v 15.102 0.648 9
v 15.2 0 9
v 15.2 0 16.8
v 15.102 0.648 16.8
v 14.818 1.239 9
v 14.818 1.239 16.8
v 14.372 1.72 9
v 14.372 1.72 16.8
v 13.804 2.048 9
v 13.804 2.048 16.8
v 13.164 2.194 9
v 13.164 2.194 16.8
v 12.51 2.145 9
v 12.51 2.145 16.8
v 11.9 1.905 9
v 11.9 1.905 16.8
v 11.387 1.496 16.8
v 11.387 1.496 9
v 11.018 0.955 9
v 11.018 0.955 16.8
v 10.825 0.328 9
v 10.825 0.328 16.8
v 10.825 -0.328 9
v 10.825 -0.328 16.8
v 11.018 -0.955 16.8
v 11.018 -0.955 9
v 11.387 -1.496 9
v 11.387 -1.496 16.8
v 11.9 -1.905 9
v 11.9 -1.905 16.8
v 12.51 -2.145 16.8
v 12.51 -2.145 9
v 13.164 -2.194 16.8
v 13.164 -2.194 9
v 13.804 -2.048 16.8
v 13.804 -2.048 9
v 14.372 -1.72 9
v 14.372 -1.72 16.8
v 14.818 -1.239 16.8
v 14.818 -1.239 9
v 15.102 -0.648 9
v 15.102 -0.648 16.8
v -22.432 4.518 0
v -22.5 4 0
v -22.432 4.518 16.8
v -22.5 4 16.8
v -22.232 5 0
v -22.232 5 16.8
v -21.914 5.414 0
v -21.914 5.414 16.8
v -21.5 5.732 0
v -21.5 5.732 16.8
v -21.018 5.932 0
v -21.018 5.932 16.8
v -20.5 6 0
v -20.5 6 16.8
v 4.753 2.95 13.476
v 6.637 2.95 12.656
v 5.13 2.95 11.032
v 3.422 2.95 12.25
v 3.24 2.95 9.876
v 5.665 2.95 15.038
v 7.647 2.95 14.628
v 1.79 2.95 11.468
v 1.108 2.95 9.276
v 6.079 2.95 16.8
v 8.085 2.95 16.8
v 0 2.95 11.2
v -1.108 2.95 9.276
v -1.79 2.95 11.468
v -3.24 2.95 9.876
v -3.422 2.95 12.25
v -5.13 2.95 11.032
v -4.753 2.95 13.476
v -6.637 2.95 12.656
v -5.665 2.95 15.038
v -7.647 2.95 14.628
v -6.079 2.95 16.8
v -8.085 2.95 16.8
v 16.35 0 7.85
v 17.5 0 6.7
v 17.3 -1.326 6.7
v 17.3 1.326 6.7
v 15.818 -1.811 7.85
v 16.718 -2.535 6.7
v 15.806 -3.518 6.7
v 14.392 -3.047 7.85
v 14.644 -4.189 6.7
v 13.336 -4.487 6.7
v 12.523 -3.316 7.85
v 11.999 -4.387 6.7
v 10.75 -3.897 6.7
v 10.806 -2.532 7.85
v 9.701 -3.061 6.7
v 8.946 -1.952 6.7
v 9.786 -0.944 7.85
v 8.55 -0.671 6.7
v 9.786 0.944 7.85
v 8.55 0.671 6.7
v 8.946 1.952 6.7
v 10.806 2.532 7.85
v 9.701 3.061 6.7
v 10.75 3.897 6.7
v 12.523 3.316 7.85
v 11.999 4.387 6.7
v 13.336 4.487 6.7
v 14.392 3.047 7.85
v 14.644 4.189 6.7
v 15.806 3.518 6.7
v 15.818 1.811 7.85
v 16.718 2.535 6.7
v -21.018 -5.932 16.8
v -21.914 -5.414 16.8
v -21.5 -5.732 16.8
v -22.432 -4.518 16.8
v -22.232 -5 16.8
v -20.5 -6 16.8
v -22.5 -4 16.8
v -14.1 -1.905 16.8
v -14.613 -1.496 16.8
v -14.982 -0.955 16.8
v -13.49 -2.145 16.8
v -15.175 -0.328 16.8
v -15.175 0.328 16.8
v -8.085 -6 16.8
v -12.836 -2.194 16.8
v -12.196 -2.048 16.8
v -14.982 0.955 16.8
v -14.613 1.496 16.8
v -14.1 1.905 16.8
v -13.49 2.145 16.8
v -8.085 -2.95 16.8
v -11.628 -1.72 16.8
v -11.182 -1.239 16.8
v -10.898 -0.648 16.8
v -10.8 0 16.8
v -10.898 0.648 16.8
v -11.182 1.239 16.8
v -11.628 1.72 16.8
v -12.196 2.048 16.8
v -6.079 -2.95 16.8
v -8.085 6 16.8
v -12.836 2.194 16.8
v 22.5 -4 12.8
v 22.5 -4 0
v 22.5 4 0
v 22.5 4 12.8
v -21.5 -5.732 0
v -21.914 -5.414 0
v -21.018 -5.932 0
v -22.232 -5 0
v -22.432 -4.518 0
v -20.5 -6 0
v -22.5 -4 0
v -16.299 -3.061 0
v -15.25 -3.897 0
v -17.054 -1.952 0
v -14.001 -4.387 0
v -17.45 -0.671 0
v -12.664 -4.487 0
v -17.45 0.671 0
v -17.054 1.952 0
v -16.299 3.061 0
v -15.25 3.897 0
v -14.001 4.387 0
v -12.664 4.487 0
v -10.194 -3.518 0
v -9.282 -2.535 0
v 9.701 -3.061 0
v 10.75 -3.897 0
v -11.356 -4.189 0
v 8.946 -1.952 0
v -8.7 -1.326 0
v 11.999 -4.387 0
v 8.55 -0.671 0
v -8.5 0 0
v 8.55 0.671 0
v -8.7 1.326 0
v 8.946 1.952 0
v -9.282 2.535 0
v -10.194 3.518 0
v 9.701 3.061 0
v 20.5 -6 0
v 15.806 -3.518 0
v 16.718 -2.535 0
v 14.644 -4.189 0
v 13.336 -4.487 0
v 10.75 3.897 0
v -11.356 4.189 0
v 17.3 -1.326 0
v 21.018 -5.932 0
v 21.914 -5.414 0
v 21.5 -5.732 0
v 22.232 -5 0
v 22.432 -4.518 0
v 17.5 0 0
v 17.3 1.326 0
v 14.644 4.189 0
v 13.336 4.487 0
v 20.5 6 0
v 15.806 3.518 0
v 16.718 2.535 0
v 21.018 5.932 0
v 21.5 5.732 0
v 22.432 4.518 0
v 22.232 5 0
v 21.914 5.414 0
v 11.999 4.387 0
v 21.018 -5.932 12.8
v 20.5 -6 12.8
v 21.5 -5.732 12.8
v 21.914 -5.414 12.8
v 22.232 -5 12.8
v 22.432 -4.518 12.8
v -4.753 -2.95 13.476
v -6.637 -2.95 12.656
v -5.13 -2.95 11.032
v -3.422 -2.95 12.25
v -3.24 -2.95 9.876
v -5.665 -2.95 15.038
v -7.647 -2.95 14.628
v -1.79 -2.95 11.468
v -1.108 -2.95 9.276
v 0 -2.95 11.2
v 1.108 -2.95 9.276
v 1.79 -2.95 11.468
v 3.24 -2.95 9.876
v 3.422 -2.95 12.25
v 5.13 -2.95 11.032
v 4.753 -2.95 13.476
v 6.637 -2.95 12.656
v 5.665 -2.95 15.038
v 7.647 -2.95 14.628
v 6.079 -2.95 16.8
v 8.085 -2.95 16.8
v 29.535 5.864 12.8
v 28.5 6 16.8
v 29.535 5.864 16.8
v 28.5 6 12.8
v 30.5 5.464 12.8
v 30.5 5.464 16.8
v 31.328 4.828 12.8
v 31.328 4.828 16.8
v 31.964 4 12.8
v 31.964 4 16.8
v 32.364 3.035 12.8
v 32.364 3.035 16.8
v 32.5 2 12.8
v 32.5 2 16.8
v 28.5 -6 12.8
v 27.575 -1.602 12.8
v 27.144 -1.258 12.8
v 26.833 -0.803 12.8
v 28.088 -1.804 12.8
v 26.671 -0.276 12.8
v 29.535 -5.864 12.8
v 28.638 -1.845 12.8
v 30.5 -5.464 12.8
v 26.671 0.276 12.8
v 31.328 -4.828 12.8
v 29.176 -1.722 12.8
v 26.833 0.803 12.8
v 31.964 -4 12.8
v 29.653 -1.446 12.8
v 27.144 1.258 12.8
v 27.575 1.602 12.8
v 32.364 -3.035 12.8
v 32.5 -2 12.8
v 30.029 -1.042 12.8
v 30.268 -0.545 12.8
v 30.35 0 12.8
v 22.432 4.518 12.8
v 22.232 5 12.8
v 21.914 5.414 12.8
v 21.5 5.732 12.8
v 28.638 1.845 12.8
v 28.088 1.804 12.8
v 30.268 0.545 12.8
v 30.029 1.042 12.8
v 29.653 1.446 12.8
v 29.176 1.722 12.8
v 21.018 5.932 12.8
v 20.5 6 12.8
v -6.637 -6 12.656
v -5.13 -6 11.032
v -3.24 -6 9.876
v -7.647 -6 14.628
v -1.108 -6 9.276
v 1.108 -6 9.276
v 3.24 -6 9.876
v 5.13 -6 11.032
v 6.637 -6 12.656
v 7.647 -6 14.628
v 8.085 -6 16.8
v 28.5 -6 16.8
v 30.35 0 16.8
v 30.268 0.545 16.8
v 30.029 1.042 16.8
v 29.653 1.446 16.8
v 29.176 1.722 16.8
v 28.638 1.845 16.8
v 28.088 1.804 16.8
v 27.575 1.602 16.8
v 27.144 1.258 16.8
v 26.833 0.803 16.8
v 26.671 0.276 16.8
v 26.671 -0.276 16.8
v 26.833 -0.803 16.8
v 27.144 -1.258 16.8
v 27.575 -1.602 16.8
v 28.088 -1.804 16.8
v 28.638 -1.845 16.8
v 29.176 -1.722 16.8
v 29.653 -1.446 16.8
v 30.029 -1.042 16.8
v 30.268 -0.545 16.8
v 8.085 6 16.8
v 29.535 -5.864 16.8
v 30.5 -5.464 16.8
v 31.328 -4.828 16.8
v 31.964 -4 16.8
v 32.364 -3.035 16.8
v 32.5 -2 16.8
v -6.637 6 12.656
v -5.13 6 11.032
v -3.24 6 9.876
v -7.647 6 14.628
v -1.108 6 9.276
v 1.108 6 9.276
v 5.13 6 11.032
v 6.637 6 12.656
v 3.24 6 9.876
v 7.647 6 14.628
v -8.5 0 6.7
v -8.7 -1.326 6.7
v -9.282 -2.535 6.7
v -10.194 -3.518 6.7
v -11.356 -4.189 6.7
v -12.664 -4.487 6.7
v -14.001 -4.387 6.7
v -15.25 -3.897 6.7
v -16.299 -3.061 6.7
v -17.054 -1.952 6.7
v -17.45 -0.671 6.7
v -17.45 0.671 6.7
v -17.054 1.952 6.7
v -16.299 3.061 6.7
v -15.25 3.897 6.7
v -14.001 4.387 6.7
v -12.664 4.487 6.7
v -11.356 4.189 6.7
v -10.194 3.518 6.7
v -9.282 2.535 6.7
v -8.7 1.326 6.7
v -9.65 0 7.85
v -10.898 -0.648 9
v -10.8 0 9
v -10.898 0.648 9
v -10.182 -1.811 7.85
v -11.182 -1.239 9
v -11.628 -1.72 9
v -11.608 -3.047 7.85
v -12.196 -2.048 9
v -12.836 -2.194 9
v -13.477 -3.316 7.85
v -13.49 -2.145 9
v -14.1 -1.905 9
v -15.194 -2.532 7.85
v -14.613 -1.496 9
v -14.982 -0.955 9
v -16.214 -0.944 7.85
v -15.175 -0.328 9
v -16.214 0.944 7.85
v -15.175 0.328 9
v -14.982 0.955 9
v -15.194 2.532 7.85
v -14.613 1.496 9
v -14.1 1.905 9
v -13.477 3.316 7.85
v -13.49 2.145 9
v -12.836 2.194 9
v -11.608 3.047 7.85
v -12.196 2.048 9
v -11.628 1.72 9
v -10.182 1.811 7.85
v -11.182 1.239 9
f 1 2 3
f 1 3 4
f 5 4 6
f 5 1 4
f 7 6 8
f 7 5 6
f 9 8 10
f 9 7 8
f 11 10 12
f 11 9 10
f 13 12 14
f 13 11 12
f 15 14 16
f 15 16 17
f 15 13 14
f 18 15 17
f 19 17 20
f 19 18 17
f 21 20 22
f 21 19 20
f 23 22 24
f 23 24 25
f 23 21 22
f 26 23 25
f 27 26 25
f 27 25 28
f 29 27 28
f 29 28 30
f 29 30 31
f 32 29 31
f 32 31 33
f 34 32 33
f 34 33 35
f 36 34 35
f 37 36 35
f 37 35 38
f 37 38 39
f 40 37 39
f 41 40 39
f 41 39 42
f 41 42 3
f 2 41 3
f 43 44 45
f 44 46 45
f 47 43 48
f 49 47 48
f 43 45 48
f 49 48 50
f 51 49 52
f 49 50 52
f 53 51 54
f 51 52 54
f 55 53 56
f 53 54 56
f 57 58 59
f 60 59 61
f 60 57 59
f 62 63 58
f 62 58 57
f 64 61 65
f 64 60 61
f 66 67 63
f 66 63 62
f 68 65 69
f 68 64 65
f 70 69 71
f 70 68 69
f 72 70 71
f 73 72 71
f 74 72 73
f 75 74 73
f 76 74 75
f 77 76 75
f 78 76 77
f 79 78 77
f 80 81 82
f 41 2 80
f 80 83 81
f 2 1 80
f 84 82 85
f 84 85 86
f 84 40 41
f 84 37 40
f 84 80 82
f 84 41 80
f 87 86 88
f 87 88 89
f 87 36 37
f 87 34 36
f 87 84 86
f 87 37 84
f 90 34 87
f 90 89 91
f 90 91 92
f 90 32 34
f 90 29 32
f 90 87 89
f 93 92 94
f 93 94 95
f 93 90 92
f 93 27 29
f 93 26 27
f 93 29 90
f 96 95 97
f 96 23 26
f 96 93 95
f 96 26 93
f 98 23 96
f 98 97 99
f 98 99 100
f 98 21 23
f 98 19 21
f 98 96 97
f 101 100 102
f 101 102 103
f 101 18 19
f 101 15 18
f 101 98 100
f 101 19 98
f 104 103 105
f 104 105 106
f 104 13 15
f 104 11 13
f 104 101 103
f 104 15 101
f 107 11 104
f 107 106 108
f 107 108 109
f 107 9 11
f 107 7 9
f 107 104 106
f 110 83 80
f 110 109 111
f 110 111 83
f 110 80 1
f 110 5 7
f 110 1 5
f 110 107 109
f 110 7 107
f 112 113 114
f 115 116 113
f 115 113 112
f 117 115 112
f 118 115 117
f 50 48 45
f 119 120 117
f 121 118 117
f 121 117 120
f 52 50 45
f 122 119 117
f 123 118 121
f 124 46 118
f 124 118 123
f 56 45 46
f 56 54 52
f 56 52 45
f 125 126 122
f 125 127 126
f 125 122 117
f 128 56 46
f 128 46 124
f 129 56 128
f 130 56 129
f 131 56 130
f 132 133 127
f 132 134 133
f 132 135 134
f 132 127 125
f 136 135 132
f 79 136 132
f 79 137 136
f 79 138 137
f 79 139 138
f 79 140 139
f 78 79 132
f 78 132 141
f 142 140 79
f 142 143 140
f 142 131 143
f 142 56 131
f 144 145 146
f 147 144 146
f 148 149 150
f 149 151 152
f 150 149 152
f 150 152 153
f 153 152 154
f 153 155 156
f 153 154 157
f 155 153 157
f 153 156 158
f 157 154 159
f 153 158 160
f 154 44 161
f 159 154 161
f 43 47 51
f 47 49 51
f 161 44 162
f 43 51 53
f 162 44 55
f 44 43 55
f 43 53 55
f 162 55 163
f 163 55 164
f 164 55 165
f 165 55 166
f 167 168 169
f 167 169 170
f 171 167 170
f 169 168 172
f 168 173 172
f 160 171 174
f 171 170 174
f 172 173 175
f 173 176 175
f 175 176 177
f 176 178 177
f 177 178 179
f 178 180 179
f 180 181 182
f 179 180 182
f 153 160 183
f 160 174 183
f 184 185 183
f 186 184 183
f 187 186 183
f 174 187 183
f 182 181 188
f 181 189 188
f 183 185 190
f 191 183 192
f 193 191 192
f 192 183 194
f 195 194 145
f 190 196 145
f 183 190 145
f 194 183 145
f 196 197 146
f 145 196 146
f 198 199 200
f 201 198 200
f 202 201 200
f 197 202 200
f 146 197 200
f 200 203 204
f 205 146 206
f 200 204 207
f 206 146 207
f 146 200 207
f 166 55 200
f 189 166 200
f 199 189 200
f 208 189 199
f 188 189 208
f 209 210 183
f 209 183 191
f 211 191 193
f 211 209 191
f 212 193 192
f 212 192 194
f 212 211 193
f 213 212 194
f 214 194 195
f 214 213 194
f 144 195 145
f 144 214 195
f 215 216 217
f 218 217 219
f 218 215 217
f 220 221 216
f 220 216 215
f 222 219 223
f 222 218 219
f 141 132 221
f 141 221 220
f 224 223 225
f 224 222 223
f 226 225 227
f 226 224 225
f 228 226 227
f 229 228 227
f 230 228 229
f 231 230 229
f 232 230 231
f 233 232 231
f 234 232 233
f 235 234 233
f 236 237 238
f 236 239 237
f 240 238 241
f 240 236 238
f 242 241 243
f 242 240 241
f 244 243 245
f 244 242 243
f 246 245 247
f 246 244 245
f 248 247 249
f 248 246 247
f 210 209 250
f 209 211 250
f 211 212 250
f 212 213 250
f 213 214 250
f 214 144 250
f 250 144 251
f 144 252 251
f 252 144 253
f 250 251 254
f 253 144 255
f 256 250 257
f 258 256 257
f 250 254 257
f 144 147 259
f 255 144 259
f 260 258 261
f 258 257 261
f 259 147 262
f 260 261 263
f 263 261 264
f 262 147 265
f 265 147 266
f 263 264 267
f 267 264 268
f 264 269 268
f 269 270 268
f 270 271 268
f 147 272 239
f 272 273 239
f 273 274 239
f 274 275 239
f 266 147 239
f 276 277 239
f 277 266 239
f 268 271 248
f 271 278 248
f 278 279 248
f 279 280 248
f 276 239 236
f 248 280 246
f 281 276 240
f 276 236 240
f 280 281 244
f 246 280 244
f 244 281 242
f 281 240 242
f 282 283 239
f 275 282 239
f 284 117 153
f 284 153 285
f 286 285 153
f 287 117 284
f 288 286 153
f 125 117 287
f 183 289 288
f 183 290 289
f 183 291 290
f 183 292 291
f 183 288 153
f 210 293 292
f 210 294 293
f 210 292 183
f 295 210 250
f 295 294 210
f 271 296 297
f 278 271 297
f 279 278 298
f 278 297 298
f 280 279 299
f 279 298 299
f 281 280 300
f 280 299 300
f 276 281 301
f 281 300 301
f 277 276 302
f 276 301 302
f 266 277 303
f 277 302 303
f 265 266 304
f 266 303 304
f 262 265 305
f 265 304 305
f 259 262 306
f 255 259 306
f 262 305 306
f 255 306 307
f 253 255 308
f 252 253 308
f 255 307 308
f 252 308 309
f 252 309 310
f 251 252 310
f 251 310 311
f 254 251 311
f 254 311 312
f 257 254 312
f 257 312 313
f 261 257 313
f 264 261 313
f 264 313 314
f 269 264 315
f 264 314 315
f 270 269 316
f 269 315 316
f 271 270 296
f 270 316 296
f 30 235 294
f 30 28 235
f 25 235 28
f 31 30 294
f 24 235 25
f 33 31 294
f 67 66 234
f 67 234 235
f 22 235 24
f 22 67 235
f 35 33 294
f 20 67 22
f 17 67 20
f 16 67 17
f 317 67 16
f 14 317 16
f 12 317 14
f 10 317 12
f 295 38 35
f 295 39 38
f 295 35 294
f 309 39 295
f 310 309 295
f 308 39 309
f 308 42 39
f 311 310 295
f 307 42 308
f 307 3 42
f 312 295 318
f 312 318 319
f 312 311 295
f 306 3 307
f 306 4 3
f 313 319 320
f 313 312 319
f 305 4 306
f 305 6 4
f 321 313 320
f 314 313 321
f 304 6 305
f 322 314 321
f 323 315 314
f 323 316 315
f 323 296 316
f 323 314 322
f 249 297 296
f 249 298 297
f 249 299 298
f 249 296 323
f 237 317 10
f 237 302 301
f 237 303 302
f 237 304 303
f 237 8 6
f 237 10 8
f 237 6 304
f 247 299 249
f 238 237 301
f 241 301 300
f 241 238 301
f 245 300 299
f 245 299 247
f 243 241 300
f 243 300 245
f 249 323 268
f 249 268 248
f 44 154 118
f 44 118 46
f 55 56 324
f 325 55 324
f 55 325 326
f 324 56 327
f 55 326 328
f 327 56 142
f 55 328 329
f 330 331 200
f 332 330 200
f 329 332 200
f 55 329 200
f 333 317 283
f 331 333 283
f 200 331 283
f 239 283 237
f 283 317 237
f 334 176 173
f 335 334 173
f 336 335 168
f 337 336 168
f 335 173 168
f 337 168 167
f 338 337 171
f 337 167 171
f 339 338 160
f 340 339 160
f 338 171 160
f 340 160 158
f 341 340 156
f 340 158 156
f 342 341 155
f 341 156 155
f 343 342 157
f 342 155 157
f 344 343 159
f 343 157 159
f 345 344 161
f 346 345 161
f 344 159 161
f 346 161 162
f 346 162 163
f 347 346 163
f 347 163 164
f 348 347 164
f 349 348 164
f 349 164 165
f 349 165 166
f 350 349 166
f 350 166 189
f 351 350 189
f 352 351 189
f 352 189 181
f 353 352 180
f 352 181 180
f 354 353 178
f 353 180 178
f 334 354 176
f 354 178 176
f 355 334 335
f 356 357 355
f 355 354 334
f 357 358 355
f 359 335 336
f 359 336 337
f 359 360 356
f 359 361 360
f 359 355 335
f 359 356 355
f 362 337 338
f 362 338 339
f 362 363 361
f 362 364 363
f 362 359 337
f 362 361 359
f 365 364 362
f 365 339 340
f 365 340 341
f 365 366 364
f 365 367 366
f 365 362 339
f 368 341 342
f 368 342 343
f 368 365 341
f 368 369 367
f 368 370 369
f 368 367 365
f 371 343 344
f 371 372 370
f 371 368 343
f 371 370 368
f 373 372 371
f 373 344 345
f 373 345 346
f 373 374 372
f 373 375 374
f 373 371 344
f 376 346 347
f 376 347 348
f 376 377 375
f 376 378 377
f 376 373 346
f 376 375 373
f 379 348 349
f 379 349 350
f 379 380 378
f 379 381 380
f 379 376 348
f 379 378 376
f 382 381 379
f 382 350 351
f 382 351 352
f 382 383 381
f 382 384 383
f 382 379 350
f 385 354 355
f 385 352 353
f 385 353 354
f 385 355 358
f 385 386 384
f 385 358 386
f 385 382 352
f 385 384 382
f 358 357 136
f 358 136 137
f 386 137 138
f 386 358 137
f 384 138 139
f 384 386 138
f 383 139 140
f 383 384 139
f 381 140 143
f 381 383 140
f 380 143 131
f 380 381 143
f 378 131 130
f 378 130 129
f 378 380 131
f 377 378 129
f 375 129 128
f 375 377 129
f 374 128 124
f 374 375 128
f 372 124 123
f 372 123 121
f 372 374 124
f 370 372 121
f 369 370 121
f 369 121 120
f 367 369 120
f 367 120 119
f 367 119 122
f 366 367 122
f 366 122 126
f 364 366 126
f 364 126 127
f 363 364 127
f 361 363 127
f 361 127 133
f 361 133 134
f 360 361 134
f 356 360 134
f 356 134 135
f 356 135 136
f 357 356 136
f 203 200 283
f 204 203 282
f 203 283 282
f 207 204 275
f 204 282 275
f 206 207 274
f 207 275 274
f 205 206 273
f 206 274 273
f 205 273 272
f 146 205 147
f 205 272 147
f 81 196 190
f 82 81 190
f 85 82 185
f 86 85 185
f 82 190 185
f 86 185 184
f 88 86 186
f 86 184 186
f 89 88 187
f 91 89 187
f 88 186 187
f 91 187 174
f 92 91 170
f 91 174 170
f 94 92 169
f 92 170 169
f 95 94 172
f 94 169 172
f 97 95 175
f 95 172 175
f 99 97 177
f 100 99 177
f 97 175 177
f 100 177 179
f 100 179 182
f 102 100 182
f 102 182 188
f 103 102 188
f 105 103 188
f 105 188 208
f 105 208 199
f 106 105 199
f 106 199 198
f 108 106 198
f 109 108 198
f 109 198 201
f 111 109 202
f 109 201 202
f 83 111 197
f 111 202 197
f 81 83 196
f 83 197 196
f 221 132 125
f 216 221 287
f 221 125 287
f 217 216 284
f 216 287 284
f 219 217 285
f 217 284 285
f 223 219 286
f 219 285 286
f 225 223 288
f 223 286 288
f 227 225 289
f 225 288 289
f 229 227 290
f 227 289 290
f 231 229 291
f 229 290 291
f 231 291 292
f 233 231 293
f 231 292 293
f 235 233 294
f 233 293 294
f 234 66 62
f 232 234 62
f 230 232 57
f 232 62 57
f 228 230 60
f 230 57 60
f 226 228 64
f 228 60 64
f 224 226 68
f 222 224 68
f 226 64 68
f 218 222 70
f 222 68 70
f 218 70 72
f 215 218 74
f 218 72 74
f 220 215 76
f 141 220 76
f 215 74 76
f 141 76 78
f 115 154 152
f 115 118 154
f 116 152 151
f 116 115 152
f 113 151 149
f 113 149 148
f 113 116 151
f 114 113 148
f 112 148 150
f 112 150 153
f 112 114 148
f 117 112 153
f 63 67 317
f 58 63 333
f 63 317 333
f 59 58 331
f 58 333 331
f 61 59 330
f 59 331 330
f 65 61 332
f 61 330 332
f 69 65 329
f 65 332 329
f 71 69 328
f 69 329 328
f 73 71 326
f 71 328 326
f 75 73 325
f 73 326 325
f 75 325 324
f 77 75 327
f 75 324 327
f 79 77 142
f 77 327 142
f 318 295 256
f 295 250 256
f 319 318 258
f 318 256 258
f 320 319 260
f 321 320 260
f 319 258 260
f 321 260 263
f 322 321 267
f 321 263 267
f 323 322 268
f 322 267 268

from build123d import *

# Parameters (mm, degrees)
F0_W      = 45
F0_H      = 12
F0_R      = 2.2
F1_DEPTH  = 16.8
F3_DEPTH  = 12.001
F4_R      = 8.1
F5_DEPTH  = 3.05
F6_R      = 8.1
F7_DEPTH  = 3.05
F8_R      = 4.5
F8_R_2    = 2.2
F9_DEPTH  = 9
F10_SIZE  = 2.29999
F11_R     = 2
F12_W     = 12
F12_H     = 12
F12_R     = 1.85
F13_DEPTH = 4
F14_R     = 4


# Not quite as in the source:
# - a fillet or chamfer is up to 0.001 mm smaller than in the source, because OpenCascade refuses the exact size


with BuildPart() as f1:
    # F0 (on Top) → F1 (new body)
    with BuildSketch(Plane.XY):
        Rectangle(F0_W, F0_H)
        with Locations((-13, 0)):
            Circle(F0_R, mode=Mode.SUBTRACT)
        with Locations((13, 0)):
            Circle(F0_R, mode=Mode.SUBTRACT)
    extrude(amount=F1_DEPTH)

    # F2 (on face) → F3 (cut, through all)
    with BuildSketch(Plane(origin=(0, 6, 0), x_dir=(-1, 0, 0), z_dir=(0, 1, 0))):
        with BuildLine():
            ThreePointArc((-6.0794736614, 16.8), (0, 11.2), (6.0794736614, 16.8))
            Line((6.0794736614, 16.8), (-6.0794736614, 16.8))
        make_face()
        with BuildLine():
            Line((-6.0794736614, 16.8), (6.0794736614, 16.8))
            ThreePointArc((6.0794736614, 16.8), (6.0948662551, 17.0497894234), (6.1, 17.3))
            ThreePointArc((6.1, 17.3), (-0.2502105766, 23.3948662551), (-6.0794736614, 16.8))
        make_face()
    extrude(amount=-F3_DEPTH, mode=Mode.SUBTRACT)

    # F4 (on face) → F5 (cut)
    with BuildSketch(Plane(origin=(0, 6, 0), x_dir=(-1, 0, 0), z_dir=(0, 1, 0))):
        with Locations((0, 17.3)):
            Circle(F4_R)
    extrude(amount=-F5_DEPTH, mode=Mode.SUBTRACT)

    # F6 (on face) → F7 (cut)
    with BuildSketch(Plane.XZ.offset(6)):
        with Locations((0, 17.3)):
            Circle(F6_R)
    extrude(amount=-F7_DEPTH, mode=Mode.SUBTRACT)

    # F8 (on face) → F9 (cut)
    with BuildSketch(Plane(origin=(0, 0, 0), x_dir=(1, 0, 0), z_dir=(0, 0, -1))):
        with Locations((-13, 0)):
            Circle(F8_R)
        with Locations((-13, 0)):
            Circle(F8_R_2, mode=Mode.SUBTRACT)
        with Locations((13, 0)):
            Circle(F8_R)
        with Locations((13, 0)):
            Circle(F8_R_2, mode=Mode.SUBTRACT)
    extrude(amount=-F9_DEPTH, mode=Mode.SUBTRACT)

    # F10 (size 2.3 in the source; OpenCascade refuses exactly that, so slightly less here)
    f10_edges = [f1.edges().sort_by_distance(p)[0] for p in [
        (-17.5, 0, 9),
        (8.5, 0, 9),
    ]]
    chamfer(f10_edges, length=F10_SIZE)

    # F11
    f11_edges = [f1.edges().sort_by_distance(p)[0] for p in [
        (22.5, -6, 8.4),
        (-22.5, -6, 8.4),
        (22.5, 6, 8.4),
        (-22.5, 6, 8.4),
    ]]
    fillet(f11_edges, radius=F11_R)

    # F12 (on face) → F13 (join)
    with BuildSketch(Plane.XY.offset(16.8)):
        with Locations((26.5, 0)):
            Rectangle(F12_W, F12_H)
        with Locations((28.5, 0)):
            Circle(F12_R, mode=Mode.SUBTRACT)
    extrude(amount=-F13_DEPTH)

    # F14
    f14_edges = [f1.edges().sort_by_distance(p)[0] for p in [
        (32.5, -6, 14.8),
        (32.5, 6, 14.8),
    ]]
    fillet(f14_edges, radius=F14_R)


solid = f1.part
